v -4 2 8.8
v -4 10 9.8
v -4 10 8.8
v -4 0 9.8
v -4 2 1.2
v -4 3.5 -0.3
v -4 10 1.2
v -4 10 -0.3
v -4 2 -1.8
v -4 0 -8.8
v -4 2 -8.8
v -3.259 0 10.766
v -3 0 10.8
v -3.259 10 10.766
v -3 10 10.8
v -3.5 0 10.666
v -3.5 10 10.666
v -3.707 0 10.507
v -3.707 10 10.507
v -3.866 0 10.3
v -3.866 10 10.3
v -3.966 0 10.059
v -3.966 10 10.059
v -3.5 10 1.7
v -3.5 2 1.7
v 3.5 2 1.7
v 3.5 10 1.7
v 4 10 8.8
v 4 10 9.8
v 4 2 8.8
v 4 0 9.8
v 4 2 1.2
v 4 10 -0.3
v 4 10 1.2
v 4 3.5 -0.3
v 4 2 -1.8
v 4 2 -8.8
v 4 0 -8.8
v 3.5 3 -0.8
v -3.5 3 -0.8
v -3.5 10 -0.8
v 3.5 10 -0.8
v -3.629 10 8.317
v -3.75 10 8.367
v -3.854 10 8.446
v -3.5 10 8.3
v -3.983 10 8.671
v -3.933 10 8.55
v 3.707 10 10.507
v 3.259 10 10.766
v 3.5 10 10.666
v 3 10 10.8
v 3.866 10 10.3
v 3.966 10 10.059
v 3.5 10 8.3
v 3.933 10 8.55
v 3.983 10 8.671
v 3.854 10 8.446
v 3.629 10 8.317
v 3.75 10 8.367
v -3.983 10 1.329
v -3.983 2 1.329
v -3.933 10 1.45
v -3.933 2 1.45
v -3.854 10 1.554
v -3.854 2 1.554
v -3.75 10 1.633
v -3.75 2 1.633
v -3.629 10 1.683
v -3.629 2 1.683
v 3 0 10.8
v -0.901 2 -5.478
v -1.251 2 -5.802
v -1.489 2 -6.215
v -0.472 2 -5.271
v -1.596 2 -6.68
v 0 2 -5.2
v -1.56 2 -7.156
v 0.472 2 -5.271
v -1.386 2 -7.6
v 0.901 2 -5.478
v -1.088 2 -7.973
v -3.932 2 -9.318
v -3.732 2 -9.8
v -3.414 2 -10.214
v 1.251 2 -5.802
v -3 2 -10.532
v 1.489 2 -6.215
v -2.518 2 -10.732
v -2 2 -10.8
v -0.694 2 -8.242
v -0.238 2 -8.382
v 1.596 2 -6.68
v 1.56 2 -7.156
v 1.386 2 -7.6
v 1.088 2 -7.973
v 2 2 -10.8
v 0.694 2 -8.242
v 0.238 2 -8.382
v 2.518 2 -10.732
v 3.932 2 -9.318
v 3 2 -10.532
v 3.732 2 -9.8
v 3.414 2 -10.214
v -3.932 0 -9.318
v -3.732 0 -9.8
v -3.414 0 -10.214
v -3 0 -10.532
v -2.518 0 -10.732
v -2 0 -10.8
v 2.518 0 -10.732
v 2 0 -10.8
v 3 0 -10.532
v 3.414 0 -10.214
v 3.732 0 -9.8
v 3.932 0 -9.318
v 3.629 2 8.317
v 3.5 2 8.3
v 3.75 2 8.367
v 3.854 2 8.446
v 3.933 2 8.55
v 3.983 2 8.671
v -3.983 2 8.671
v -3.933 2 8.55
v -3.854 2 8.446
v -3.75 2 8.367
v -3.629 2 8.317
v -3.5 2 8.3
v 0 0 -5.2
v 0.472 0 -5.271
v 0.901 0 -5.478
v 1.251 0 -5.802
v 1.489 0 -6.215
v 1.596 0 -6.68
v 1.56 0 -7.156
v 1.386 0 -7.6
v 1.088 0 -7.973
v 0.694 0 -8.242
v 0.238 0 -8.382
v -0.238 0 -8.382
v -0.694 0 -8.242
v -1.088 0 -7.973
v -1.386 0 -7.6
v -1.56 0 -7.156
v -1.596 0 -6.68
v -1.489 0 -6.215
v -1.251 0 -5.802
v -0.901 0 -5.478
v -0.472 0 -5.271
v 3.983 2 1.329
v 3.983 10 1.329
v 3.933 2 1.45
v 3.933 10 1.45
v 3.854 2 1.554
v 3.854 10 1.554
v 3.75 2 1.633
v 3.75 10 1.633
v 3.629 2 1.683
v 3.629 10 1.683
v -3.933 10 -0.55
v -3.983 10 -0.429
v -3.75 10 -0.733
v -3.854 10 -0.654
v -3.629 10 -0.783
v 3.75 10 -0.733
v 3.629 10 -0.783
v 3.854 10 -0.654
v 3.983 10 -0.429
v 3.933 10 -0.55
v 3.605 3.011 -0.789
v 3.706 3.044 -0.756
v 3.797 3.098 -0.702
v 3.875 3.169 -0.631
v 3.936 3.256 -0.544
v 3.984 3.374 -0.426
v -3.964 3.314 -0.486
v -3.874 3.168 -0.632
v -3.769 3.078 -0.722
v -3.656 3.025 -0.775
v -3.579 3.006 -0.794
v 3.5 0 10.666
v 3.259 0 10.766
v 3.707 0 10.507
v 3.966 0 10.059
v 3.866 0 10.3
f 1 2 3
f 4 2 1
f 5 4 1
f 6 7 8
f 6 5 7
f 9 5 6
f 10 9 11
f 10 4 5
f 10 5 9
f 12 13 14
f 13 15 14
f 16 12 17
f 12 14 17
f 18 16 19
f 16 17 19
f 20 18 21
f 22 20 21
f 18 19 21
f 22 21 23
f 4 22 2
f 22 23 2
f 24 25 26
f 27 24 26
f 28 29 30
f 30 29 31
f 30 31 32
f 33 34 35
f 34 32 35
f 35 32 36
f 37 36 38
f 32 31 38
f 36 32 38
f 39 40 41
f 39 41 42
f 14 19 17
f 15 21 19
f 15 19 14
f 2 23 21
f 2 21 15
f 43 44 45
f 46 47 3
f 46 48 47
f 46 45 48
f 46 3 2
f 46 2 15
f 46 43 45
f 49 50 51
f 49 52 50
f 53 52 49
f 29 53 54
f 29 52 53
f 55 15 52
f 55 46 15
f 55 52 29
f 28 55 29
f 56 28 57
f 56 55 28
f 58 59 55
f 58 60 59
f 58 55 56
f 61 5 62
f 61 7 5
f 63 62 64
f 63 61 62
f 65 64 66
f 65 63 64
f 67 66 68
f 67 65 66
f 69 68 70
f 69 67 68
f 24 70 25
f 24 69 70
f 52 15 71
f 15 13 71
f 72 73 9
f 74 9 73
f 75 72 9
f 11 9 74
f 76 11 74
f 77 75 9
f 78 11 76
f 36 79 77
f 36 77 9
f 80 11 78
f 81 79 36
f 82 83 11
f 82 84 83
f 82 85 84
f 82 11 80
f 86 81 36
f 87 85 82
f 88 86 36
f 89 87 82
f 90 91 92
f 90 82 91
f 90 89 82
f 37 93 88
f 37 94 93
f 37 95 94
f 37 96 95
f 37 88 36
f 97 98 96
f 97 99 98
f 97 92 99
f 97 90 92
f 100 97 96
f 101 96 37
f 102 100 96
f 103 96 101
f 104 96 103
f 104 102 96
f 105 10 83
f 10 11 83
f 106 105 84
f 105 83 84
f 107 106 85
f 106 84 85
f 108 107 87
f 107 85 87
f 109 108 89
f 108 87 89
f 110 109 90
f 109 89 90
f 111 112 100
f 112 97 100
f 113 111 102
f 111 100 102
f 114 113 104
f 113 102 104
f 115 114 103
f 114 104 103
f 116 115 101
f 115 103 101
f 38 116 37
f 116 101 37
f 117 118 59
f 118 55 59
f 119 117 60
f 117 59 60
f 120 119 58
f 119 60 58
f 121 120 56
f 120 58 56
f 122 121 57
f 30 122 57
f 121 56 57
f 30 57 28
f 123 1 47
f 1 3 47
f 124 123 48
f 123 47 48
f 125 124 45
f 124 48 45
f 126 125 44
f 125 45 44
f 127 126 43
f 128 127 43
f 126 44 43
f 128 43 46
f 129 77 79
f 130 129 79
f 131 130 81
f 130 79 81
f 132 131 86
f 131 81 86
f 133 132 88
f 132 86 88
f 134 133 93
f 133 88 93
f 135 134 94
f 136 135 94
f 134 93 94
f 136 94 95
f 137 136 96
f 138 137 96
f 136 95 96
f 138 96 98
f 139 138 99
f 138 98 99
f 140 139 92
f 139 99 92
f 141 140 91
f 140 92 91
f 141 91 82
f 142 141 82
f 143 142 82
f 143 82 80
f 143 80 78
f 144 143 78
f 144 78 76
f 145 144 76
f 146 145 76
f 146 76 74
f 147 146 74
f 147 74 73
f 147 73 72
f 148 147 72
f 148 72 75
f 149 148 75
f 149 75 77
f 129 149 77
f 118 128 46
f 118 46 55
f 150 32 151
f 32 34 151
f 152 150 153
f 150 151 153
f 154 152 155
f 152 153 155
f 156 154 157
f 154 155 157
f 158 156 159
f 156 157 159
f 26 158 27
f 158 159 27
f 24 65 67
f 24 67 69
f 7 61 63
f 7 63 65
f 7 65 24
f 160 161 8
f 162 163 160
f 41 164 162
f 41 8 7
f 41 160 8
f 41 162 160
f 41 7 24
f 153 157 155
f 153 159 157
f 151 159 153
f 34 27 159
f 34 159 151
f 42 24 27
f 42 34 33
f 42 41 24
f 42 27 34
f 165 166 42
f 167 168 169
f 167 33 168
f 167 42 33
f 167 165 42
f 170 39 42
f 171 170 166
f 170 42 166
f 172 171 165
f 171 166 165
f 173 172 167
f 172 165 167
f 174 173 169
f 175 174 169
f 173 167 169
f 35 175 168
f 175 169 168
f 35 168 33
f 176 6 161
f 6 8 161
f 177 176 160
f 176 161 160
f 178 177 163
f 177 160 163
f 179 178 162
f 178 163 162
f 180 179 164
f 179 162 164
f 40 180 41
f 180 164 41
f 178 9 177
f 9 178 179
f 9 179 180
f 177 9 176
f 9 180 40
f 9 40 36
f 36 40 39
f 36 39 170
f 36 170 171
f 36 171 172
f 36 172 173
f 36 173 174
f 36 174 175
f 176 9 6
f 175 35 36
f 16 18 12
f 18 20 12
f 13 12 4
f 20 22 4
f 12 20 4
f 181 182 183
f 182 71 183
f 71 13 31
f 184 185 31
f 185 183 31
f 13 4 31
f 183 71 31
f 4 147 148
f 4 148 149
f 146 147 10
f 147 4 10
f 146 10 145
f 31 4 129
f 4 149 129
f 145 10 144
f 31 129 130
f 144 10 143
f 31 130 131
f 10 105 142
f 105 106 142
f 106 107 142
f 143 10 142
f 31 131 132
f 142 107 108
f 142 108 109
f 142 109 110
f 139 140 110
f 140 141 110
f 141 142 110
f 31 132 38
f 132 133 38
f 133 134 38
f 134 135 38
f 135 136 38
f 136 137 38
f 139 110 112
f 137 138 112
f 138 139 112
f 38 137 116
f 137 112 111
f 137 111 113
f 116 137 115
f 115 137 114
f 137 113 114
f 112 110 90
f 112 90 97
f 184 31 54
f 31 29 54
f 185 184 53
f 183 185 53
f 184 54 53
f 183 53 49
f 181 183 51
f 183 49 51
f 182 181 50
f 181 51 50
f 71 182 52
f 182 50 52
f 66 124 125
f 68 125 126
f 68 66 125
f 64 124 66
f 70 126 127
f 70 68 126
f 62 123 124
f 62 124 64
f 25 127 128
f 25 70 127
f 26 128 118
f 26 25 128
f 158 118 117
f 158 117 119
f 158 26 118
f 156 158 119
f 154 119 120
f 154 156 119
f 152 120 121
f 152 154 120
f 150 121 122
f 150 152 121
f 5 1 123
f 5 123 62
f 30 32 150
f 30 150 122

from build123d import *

# Parameters (mm, degrees)
ESBO_O1_W                = 8
ESBO_O1_H                = 21.6
RESSALTO_EXTRUS_O1_DEPTH = 2
ESBO_O2_W                = 8
ESBO_O2_H                = 2.5
RESSALTO_EXTRUS_O2_DEPTH = 8
ESBO_O3_R                = 1.6
CORTE_EXTRUS_O1_DEPTH    = 8
FILETE1_R                = 2
FILETE2_R                = 2
FILETE3_R                = 1
FILETE4_R                = 1
CHANFRO1_SIZE            = 1
FILETE5_R                = 0.5
FILETE6_R                = 0.5
FILETE7_R                = 0.5
FILETE8_R                = 0.5
FILETE9_R                = 0.5
FILETE10_R               = 0.5


with BuildPart() as part:
    # Esboço1 → Ressalto-extrusão1 (new body)
    with BuildSketch(Plane(origin=(0, 0, 0), x_dir=(1, 0, 0), z_dir=(0, 1, 0))):
        Rectangle(ESBO_O1_W, ESBO_O1_H)
    extrude(amount=RESSALTO_EXTRUS_O1_DEPTH)

    # Esboço2 → Ressalto-extrusão2 (add)
    with BuildSketch(Plane(origin=(0, 2, 0), x_dir=(1, 0, 0), z_dir=(0, 1, 0))):
        with Locations((0, -9.55)):
            Rectangle(ESBO_O2_W, ESBO_O2_H)
        with Locations((0, -0.45)):
            Rectangle(ESBO_O2_W, ESBO_O2_H)
    extrude(amount=RESSALTO_EXTRUS_O2_DEPTH)

    # Esboço3 → Corte-extrusão1 (cut)
    with BuildSketch(Plane(origin=(0, 2, 0), x_dir=(1, 0, 0), z_dir=(0, 1, 0))):
        with Locations(Location((0, 6.8, 0), (0, 0, 270))):
            Circle(ESBO_O3_R)
    extrude(amount=-CORTE_EXTRUS_O1_DEPTH, mode=Mode.SUBTRACT)

    # Filete1
    filete1_edges = [part.edges().sort_by_distance(p)[0] for p in [
        (-4, 1, -10.8),
    ]]
    fillet(filete1_edges, radius=FILETE1_R)

    # Filete2
    filete2_edges = [part.edges().sort_by_distance(p)[0] for p in [
        (4, 1, -10.8),
    ]]
    fillet(filete2_edges, radius=FILETE2_R)

    # Filete3
    filete3_edges = [part.edges().sort_by_distance(p)[0] for p in [
        (4, 5, 10.8),
    ]]
    fillet(filete3_edges, radius=FILETE3_R)

    # Filete4
    filete4_edges = [part.edges().sort_by_distance(p)[0] for p in [
        (-4, 5, 10.8),
    ]]
    fillet(filete4_edges, radius=FILETE4_R)

    # Chanfro1
    chanfro1_edges = [part.edges().sort_by_distance(p)[0] for p in [
        (0, 2, -0.8),
    ]]
    chamfer(chanfro1_edges, length=CHANFRO1_SIZE)

    # Filete5
    filete5_edges = [part.edges().sort_by_distance(p)[0] for p in [
        (4, 6.5, -0.8),
    ]]
    fillet(filete5_edges, radius=FILETE5_R)

    # Filete6
    filete6_edges = [part.edges().sort_by_distance(p)[0] for p in [
        (-4, 6.5, -0.8),
    ]]
    fillet(filete6_edges, radius=FILETE6_R)

    # Filete7
    filete7_edges = [part.edges().sort_by_distance(p)[0] for p in [
        (4, 6, 8.3),
    ]]
    fillet(filete7_edges, radius=FILETE7_R)

    # Filete8
    filete8_edges = [part.edges().sort_by_distance(p)[0] for p in [
        (-4, 6, 8.3),
    ]]
    fillet(filete8_edges, radius=FILETE8_R)

    # Filete9
    filete9_edges = [part.edges().sort_by_distance(p)[0] for p in [
        (-4, 6, 1.7),
    ]]
    fillet(filete9_edges, radius=FILETE9_R)

    # Filete10
    filete10_edges = [part.edges().sort_by_distance(p)[0] for p in [
        (4, 6, 1.7),
    ]]
    fillet(filete10_edges, radius=FILETE10_R)


solid = part.part
